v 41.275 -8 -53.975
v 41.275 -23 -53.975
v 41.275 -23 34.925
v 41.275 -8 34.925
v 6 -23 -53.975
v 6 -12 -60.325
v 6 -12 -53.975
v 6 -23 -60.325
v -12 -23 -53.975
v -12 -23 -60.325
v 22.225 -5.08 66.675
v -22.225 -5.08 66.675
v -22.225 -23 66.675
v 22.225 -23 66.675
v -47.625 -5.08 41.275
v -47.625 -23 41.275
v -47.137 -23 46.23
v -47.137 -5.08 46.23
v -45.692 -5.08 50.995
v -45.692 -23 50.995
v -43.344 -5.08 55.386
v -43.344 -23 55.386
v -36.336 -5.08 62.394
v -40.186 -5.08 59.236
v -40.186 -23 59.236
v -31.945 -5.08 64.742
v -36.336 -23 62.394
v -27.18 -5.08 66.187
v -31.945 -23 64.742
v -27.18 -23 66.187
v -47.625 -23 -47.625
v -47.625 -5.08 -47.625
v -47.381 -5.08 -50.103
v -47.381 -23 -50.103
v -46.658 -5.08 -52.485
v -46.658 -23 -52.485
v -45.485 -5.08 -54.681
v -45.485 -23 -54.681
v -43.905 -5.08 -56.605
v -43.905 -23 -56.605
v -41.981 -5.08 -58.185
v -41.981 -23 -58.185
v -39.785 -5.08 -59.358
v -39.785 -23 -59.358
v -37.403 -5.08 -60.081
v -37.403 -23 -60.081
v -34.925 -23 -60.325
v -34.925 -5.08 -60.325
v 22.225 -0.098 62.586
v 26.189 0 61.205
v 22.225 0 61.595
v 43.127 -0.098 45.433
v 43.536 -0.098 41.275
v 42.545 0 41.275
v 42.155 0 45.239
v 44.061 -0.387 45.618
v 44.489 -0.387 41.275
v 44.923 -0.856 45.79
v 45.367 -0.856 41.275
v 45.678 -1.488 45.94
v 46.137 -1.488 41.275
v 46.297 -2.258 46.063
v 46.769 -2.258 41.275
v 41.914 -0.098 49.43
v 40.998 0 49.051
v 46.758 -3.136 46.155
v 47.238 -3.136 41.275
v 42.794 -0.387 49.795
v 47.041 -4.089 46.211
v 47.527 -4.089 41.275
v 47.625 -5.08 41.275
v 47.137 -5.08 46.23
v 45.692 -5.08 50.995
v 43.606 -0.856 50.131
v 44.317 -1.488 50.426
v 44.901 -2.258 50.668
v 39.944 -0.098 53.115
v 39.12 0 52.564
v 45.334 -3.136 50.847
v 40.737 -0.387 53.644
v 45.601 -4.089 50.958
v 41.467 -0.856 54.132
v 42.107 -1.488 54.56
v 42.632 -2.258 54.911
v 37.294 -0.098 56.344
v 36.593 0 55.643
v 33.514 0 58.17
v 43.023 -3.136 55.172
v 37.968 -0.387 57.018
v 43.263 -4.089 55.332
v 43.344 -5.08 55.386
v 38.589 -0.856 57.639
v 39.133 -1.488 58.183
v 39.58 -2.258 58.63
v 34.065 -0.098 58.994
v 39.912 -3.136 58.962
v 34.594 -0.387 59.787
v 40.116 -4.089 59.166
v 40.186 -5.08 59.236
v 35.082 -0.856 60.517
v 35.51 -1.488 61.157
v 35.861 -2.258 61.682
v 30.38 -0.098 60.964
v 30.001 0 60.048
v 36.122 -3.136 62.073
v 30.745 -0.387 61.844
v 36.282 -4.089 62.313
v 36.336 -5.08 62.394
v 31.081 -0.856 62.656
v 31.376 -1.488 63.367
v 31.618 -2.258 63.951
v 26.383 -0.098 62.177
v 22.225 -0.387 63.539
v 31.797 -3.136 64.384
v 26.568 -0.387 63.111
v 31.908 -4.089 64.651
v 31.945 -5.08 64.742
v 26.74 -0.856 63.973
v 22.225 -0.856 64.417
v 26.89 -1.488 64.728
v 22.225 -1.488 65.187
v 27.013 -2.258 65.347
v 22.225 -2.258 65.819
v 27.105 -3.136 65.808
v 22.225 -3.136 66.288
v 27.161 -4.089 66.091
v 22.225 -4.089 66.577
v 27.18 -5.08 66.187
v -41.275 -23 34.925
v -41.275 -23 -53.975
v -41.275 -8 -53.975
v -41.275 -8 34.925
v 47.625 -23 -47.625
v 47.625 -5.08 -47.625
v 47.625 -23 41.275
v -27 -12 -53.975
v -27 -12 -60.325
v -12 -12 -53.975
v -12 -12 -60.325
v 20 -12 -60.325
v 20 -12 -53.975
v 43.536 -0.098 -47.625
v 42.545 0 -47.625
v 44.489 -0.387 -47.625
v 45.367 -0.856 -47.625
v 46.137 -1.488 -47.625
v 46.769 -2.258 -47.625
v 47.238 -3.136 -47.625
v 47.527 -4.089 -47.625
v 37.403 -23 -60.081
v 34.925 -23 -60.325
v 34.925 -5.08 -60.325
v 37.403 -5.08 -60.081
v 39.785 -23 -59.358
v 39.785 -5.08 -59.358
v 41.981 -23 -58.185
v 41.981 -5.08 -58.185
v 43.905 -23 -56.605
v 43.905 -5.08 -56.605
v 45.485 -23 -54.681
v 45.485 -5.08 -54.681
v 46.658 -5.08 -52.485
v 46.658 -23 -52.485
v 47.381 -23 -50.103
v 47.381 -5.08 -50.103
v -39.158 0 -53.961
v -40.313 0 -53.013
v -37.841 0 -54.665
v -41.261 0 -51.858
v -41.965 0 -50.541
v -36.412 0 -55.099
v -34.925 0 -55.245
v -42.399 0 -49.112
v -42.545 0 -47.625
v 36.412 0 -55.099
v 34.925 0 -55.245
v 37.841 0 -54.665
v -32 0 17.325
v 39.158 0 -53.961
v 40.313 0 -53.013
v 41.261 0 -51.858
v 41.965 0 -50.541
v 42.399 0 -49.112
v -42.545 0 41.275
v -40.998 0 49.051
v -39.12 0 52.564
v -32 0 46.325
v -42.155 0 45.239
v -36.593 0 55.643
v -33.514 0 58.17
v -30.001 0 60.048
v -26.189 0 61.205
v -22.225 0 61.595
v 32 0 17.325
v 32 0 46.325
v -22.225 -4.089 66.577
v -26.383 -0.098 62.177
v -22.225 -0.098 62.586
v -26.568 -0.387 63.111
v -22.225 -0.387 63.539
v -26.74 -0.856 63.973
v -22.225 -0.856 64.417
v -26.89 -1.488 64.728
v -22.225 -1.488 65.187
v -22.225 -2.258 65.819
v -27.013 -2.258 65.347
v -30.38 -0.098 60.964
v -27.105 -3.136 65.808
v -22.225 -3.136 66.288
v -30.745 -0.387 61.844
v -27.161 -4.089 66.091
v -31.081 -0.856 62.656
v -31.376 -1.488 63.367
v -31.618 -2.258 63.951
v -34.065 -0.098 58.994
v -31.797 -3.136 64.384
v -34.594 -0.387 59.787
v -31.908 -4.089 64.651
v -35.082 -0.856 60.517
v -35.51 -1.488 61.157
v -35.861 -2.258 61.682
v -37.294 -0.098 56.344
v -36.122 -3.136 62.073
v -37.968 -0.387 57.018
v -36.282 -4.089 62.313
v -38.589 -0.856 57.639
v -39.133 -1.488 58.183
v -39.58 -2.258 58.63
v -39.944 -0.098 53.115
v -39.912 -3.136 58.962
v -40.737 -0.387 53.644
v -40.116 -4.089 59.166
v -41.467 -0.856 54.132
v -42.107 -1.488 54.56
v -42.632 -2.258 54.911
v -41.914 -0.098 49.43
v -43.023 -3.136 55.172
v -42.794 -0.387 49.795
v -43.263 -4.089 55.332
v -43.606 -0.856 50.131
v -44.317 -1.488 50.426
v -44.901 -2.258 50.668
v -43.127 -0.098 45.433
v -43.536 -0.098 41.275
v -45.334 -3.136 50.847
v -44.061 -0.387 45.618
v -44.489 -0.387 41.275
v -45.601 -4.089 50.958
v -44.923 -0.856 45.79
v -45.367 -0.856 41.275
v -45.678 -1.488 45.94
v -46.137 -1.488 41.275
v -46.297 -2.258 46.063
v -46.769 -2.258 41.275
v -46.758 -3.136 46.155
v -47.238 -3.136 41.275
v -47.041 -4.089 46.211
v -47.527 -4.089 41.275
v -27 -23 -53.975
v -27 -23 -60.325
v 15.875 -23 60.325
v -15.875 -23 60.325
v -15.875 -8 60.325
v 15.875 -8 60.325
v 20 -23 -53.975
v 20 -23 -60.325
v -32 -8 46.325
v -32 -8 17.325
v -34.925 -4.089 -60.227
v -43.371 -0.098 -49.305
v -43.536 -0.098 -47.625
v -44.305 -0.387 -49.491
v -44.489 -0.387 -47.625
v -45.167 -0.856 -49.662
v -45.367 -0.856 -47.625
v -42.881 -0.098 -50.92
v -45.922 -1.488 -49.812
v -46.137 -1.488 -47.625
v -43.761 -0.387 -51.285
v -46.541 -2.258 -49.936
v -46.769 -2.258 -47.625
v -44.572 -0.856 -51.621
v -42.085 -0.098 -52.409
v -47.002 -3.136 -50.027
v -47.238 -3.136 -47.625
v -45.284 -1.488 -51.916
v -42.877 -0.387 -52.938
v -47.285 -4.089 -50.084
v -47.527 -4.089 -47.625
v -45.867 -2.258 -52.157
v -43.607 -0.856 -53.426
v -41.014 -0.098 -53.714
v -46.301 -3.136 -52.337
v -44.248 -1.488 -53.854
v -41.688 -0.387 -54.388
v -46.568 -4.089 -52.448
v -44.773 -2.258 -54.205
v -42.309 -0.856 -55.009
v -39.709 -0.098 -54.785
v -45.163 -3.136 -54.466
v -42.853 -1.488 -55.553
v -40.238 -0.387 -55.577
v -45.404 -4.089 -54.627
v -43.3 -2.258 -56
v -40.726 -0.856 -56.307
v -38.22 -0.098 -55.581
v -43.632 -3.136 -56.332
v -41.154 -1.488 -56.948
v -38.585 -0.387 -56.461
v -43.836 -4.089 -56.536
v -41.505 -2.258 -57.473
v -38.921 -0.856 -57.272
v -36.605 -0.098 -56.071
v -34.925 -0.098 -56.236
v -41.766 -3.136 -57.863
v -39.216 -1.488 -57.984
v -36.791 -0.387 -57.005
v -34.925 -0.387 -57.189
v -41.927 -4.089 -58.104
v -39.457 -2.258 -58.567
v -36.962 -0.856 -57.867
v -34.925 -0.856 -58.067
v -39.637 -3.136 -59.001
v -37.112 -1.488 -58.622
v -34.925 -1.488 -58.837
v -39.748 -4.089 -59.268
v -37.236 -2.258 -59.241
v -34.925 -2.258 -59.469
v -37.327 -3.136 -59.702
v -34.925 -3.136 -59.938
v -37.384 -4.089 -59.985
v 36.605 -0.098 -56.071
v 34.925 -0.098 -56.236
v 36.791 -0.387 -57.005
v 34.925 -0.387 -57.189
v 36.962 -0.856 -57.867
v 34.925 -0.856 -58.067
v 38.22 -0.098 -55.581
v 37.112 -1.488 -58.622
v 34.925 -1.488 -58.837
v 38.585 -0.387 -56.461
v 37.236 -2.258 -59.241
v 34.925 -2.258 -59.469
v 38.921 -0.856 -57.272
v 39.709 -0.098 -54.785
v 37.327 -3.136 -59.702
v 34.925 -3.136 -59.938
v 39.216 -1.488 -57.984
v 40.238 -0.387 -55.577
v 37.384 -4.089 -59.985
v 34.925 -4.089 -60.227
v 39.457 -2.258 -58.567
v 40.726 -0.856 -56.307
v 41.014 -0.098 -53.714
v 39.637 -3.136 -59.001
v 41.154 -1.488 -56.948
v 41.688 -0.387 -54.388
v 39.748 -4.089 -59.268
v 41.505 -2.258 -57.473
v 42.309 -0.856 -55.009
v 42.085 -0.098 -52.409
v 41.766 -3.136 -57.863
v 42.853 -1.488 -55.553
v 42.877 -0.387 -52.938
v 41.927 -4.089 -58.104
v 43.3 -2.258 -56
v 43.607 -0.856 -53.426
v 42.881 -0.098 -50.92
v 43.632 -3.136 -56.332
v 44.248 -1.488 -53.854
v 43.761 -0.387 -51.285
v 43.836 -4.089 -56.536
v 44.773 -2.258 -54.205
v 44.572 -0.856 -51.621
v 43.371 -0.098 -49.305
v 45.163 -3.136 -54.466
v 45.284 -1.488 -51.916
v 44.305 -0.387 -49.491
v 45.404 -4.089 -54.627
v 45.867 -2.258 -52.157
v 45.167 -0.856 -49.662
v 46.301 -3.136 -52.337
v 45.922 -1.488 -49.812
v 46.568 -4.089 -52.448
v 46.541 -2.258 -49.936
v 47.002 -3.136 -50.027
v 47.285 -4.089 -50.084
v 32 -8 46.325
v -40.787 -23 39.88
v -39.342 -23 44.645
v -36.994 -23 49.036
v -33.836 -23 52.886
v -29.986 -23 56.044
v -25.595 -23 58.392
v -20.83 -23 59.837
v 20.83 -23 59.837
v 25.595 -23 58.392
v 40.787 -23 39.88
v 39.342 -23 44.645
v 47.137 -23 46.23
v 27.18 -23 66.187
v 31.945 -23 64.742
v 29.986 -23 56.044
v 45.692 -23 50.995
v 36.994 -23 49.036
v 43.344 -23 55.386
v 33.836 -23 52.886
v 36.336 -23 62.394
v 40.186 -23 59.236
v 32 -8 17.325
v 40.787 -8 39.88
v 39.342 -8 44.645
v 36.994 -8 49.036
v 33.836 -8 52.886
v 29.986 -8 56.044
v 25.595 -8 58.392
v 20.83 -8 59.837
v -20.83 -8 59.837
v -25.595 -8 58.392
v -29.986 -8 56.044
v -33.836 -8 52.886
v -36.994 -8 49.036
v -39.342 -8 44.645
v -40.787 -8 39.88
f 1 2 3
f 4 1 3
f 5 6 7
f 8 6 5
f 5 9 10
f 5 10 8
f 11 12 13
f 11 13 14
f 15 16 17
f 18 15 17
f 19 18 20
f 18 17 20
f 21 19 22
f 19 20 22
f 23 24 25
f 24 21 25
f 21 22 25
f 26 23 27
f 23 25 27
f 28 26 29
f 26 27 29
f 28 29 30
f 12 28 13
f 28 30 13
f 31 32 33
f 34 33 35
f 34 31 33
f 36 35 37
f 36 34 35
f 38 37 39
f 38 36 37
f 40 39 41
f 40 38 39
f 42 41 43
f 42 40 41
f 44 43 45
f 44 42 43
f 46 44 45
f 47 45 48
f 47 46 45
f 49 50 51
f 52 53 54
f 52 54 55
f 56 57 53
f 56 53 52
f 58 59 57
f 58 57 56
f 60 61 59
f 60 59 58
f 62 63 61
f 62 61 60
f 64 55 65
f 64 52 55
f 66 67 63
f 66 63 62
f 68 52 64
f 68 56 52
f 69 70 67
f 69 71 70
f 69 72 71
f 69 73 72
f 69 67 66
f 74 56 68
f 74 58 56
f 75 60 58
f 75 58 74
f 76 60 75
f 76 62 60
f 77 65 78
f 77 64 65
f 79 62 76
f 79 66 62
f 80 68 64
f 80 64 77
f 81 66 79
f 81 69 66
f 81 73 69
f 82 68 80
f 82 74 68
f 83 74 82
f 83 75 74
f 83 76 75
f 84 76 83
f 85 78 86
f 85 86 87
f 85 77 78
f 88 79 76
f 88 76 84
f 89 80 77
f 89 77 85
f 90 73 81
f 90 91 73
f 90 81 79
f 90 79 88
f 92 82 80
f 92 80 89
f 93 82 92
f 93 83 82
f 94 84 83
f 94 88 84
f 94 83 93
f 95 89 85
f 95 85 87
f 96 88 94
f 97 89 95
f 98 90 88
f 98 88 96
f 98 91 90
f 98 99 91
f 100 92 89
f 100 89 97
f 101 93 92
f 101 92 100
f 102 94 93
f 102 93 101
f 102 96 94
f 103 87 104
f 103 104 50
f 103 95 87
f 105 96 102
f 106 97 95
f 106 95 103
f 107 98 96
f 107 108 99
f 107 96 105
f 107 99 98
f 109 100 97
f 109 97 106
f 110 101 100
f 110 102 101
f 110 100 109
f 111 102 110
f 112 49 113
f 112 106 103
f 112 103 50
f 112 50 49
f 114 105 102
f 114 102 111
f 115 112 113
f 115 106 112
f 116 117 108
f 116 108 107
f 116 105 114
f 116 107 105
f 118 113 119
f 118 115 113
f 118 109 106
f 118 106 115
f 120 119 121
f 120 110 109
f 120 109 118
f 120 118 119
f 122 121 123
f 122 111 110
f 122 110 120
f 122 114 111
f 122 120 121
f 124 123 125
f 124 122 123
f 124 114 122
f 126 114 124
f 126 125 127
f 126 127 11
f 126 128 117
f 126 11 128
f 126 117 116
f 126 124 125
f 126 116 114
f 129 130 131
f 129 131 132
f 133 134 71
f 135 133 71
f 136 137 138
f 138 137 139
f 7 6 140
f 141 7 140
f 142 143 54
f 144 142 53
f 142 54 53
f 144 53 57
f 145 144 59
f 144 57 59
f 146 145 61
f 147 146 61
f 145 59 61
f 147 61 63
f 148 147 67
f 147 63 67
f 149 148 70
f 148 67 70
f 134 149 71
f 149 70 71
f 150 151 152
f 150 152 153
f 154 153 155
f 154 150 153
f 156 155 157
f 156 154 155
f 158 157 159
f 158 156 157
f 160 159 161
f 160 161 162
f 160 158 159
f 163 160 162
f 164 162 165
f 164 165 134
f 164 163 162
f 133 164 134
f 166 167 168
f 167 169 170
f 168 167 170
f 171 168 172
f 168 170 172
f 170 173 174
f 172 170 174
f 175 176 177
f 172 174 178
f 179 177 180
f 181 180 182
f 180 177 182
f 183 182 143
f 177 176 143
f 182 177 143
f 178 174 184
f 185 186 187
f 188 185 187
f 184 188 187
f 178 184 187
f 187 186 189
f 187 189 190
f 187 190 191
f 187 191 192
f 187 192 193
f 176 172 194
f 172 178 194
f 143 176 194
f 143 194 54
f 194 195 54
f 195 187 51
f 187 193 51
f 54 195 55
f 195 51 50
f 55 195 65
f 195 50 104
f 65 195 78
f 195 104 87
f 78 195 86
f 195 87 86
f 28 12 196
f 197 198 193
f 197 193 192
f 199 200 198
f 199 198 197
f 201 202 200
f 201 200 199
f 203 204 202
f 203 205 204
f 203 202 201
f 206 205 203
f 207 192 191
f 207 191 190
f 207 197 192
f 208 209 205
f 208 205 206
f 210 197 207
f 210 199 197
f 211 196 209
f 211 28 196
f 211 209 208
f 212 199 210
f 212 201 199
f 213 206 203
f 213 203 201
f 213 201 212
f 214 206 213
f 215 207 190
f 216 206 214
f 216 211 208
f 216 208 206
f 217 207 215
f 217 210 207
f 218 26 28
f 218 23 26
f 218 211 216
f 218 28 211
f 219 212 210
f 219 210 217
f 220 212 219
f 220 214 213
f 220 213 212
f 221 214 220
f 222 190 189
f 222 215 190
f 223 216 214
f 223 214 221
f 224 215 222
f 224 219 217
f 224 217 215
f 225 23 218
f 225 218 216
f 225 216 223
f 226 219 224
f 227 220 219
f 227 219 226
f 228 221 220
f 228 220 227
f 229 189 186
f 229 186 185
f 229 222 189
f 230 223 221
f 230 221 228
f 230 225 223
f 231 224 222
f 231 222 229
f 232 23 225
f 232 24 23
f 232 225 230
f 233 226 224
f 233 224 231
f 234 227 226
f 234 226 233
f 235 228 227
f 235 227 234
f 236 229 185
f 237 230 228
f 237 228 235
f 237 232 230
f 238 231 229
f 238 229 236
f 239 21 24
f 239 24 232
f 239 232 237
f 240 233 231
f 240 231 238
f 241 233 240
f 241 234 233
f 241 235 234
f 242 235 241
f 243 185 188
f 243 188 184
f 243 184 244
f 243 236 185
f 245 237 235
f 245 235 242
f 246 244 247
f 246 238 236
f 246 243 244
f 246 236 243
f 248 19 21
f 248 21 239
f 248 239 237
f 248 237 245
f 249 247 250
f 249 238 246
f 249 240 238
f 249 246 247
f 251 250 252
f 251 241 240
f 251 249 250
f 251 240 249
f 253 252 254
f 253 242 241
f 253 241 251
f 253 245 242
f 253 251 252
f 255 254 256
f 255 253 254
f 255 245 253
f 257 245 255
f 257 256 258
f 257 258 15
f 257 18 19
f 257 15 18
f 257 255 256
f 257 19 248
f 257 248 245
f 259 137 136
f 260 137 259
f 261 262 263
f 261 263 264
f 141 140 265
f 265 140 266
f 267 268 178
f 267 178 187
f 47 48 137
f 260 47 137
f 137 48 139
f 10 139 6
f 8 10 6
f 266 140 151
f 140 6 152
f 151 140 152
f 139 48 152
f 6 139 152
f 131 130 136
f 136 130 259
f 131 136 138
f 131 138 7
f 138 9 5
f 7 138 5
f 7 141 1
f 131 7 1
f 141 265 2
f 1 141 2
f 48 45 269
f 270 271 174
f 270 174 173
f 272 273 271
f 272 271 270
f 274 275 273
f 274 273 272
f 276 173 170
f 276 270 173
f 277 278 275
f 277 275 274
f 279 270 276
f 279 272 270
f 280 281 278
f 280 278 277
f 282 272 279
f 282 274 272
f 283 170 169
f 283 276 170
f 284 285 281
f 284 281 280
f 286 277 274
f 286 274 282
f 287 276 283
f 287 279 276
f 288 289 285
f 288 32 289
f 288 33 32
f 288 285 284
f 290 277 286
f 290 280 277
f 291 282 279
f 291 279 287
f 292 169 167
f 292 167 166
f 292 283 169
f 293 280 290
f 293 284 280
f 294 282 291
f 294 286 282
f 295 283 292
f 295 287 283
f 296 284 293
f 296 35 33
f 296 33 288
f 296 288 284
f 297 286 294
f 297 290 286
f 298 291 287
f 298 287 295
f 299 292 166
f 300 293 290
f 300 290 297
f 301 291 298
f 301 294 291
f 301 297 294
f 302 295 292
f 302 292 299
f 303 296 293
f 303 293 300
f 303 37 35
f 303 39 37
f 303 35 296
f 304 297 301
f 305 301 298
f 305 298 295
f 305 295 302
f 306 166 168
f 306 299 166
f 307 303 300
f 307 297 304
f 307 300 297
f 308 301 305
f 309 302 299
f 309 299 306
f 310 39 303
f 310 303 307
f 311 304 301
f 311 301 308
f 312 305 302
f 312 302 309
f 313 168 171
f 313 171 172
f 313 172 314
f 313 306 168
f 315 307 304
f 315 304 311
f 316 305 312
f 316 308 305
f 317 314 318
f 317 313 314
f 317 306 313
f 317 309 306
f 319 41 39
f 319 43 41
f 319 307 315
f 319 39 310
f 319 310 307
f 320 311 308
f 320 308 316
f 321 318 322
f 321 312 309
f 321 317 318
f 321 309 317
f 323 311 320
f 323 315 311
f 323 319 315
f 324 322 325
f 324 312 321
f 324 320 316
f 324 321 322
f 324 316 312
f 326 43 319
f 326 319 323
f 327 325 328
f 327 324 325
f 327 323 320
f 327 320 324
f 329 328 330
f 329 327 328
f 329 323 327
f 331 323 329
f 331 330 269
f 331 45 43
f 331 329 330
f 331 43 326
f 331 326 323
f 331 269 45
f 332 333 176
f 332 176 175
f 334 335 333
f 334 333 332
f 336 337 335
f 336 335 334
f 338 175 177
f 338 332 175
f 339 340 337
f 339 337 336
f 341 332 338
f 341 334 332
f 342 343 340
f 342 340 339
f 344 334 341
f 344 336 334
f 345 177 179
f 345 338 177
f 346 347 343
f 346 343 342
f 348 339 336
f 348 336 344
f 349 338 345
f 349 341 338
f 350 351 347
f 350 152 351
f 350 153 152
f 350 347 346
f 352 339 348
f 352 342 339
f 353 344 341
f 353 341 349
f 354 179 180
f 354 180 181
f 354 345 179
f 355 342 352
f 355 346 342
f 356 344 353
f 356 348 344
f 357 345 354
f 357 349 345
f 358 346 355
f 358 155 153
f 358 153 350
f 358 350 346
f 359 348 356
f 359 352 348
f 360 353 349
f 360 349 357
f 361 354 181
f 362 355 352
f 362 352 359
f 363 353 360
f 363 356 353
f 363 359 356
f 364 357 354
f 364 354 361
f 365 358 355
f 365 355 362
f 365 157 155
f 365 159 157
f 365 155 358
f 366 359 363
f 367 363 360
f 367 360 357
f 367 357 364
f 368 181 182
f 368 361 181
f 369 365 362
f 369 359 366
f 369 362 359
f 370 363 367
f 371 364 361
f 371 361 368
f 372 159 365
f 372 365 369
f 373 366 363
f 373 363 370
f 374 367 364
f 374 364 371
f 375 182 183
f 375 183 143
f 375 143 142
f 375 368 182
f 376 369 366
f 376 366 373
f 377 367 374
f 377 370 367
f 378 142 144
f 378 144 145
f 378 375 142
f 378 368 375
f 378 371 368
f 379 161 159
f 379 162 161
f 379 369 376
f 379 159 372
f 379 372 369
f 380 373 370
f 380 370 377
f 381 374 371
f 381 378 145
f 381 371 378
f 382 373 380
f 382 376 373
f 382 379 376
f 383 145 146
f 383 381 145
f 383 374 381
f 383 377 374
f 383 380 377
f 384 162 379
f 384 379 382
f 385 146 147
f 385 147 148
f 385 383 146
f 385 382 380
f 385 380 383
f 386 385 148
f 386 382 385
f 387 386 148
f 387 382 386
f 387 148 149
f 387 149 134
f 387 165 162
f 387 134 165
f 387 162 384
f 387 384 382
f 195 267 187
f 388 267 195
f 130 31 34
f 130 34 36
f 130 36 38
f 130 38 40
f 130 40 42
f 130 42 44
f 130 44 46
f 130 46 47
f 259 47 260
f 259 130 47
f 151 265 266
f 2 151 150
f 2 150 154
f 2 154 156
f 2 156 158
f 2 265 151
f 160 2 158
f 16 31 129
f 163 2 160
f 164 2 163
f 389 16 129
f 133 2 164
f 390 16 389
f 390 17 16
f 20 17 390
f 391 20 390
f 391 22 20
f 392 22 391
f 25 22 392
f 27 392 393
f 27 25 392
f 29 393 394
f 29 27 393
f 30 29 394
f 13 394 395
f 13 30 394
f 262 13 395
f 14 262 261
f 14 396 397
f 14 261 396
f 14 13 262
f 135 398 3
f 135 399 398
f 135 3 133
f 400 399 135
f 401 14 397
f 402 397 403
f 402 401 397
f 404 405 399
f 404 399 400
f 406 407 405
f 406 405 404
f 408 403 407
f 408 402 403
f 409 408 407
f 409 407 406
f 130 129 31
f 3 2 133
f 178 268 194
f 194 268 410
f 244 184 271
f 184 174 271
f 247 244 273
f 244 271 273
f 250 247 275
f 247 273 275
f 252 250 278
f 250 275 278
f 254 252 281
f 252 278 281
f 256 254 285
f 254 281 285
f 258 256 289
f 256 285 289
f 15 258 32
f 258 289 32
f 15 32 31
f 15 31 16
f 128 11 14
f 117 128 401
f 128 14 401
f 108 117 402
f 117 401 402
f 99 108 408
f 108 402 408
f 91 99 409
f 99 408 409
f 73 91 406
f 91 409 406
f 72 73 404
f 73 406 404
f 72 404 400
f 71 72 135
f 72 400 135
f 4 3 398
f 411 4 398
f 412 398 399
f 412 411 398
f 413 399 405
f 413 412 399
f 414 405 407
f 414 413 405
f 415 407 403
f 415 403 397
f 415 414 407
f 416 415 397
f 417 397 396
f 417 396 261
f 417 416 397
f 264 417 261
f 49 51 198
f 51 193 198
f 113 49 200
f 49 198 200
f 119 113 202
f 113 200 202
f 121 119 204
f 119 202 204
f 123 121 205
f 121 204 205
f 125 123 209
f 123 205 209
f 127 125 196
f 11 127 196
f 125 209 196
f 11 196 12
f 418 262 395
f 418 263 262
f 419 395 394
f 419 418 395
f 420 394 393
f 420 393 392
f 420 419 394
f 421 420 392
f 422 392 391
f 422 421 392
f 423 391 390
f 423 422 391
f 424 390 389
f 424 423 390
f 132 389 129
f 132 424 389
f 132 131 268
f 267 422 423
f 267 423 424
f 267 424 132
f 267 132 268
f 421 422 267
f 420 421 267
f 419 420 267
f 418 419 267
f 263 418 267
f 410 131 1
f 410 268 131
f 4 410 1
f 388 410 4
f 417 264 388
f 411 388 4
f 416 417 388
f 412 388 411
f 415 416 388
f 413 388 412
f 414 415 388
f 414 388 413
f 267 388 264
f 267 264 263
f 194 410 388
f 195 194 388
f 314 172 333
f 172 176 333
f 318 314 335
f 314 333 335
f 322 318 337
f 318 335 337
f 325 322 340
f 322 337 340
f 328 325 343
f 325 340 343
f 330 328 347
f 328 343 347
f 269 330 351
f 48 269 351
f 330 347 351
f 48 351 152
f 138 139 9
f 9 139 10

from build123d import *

# Parameters (mm, degrees)
F0_W      = 95.25
F0_H      = 127
F1_DEPTH  = 23
F2_W      = 82.55
F2_H      = 114.3
F3_DEPTH  = 15
F4_W      = 64
F4_H      = 29
F5_DEPTH  = 25.4
F6_R      = 25.4
F7_R      = 12.7
F8_R      = 5.08
F9_W      = 14
F9_H      = 11
F10_DEPTH = 12.7
F11_W     = 15
F11_H     = 11
F12_DEPTH = 12.7


with BuildPart() as f1:
    # F0 (on Front) → F1 (new body)
    with BuildSketch(Plane.XZ):
        with Locations((0, 3.175)):
            Rectangle(F0_W, F0_H)
    extrude(amount=F1_DEPTH)

    # F2 (on face) → F3 (cut)
    with BuildSketch(Plane.XZ.offset(23)):
        with Locations((0, 3.175)):
            Rectangle(F2_W, F2_H)
    extrude(amount=-F3_DEPTH, mode=Mode.SUBTRACT)

    # F4 (on face) → F5 (cut)
    with BuildSketch(Plane.XZ.offset(8)):
        with Locations((0, 31.825)):
            Rectangle(F4_W, F4_H)
    extrude(amount=-F5_DEPTH, mode=Mode.SUBTRACT)

    # F6
    f6_edges = [f1.edges().sort_by_distance(p)[0] for p in [
        (-47.625, -11.5, 66.675),
        (47.625, -11.5, 66.675),
        (41.275, -15.5, 60.325),
        (-41.275, -15.5, 60.325),
    ]]
    fillet(f6_edges, radius=F6_R)

    # F7
    f7_edges = [f1.edges().sort_by_distance(p)[0] for p in [
        (-47.625, -11.5, -60.325),
        (47.625, -11.5, -60.325),
    ]]
    fillet(f7_edges, radius=F7_R)

    # F8
    f8_edges = [f1.edges().sort_by_distance(p)[0] for p in [
        (47.625, 0, -3.175),
        (40.185512, 0, 59.235512),
        (0, 0, 66.675),
        (-40.185512, 0, 59.235512),
        (-47.625, 0, -3.175),
    ]]
    fillet(f8_edges, radius=F8_R)

    # F9 (on face) → F10 (cut)
    with BuildSketch(Plane(origin=(0, 0, -60.325), x_dir=(1, 0, 0), z_dir=(0, 0, -1))):
        with Locations((13, 17.5)):
            Rectangle(F9_W, F9_H)
    extrude(amount=-F10_DEPTH, mode=Mode.SUBTRACT)

    # F11 (on face) → F12 (cut)
    with BuildSketch(Plane(origin=(0, 0, -60.325), x_dir=(1, 0, 0), z_dir=(0, 0, -1))):
        with Locations((-19.5, 17.5)):
            Rectangle(F11_W, F11_H)
    extrude(amount=-F12_DEPTH, mode=Mode.SUBTRACT)


solid = f1.part
